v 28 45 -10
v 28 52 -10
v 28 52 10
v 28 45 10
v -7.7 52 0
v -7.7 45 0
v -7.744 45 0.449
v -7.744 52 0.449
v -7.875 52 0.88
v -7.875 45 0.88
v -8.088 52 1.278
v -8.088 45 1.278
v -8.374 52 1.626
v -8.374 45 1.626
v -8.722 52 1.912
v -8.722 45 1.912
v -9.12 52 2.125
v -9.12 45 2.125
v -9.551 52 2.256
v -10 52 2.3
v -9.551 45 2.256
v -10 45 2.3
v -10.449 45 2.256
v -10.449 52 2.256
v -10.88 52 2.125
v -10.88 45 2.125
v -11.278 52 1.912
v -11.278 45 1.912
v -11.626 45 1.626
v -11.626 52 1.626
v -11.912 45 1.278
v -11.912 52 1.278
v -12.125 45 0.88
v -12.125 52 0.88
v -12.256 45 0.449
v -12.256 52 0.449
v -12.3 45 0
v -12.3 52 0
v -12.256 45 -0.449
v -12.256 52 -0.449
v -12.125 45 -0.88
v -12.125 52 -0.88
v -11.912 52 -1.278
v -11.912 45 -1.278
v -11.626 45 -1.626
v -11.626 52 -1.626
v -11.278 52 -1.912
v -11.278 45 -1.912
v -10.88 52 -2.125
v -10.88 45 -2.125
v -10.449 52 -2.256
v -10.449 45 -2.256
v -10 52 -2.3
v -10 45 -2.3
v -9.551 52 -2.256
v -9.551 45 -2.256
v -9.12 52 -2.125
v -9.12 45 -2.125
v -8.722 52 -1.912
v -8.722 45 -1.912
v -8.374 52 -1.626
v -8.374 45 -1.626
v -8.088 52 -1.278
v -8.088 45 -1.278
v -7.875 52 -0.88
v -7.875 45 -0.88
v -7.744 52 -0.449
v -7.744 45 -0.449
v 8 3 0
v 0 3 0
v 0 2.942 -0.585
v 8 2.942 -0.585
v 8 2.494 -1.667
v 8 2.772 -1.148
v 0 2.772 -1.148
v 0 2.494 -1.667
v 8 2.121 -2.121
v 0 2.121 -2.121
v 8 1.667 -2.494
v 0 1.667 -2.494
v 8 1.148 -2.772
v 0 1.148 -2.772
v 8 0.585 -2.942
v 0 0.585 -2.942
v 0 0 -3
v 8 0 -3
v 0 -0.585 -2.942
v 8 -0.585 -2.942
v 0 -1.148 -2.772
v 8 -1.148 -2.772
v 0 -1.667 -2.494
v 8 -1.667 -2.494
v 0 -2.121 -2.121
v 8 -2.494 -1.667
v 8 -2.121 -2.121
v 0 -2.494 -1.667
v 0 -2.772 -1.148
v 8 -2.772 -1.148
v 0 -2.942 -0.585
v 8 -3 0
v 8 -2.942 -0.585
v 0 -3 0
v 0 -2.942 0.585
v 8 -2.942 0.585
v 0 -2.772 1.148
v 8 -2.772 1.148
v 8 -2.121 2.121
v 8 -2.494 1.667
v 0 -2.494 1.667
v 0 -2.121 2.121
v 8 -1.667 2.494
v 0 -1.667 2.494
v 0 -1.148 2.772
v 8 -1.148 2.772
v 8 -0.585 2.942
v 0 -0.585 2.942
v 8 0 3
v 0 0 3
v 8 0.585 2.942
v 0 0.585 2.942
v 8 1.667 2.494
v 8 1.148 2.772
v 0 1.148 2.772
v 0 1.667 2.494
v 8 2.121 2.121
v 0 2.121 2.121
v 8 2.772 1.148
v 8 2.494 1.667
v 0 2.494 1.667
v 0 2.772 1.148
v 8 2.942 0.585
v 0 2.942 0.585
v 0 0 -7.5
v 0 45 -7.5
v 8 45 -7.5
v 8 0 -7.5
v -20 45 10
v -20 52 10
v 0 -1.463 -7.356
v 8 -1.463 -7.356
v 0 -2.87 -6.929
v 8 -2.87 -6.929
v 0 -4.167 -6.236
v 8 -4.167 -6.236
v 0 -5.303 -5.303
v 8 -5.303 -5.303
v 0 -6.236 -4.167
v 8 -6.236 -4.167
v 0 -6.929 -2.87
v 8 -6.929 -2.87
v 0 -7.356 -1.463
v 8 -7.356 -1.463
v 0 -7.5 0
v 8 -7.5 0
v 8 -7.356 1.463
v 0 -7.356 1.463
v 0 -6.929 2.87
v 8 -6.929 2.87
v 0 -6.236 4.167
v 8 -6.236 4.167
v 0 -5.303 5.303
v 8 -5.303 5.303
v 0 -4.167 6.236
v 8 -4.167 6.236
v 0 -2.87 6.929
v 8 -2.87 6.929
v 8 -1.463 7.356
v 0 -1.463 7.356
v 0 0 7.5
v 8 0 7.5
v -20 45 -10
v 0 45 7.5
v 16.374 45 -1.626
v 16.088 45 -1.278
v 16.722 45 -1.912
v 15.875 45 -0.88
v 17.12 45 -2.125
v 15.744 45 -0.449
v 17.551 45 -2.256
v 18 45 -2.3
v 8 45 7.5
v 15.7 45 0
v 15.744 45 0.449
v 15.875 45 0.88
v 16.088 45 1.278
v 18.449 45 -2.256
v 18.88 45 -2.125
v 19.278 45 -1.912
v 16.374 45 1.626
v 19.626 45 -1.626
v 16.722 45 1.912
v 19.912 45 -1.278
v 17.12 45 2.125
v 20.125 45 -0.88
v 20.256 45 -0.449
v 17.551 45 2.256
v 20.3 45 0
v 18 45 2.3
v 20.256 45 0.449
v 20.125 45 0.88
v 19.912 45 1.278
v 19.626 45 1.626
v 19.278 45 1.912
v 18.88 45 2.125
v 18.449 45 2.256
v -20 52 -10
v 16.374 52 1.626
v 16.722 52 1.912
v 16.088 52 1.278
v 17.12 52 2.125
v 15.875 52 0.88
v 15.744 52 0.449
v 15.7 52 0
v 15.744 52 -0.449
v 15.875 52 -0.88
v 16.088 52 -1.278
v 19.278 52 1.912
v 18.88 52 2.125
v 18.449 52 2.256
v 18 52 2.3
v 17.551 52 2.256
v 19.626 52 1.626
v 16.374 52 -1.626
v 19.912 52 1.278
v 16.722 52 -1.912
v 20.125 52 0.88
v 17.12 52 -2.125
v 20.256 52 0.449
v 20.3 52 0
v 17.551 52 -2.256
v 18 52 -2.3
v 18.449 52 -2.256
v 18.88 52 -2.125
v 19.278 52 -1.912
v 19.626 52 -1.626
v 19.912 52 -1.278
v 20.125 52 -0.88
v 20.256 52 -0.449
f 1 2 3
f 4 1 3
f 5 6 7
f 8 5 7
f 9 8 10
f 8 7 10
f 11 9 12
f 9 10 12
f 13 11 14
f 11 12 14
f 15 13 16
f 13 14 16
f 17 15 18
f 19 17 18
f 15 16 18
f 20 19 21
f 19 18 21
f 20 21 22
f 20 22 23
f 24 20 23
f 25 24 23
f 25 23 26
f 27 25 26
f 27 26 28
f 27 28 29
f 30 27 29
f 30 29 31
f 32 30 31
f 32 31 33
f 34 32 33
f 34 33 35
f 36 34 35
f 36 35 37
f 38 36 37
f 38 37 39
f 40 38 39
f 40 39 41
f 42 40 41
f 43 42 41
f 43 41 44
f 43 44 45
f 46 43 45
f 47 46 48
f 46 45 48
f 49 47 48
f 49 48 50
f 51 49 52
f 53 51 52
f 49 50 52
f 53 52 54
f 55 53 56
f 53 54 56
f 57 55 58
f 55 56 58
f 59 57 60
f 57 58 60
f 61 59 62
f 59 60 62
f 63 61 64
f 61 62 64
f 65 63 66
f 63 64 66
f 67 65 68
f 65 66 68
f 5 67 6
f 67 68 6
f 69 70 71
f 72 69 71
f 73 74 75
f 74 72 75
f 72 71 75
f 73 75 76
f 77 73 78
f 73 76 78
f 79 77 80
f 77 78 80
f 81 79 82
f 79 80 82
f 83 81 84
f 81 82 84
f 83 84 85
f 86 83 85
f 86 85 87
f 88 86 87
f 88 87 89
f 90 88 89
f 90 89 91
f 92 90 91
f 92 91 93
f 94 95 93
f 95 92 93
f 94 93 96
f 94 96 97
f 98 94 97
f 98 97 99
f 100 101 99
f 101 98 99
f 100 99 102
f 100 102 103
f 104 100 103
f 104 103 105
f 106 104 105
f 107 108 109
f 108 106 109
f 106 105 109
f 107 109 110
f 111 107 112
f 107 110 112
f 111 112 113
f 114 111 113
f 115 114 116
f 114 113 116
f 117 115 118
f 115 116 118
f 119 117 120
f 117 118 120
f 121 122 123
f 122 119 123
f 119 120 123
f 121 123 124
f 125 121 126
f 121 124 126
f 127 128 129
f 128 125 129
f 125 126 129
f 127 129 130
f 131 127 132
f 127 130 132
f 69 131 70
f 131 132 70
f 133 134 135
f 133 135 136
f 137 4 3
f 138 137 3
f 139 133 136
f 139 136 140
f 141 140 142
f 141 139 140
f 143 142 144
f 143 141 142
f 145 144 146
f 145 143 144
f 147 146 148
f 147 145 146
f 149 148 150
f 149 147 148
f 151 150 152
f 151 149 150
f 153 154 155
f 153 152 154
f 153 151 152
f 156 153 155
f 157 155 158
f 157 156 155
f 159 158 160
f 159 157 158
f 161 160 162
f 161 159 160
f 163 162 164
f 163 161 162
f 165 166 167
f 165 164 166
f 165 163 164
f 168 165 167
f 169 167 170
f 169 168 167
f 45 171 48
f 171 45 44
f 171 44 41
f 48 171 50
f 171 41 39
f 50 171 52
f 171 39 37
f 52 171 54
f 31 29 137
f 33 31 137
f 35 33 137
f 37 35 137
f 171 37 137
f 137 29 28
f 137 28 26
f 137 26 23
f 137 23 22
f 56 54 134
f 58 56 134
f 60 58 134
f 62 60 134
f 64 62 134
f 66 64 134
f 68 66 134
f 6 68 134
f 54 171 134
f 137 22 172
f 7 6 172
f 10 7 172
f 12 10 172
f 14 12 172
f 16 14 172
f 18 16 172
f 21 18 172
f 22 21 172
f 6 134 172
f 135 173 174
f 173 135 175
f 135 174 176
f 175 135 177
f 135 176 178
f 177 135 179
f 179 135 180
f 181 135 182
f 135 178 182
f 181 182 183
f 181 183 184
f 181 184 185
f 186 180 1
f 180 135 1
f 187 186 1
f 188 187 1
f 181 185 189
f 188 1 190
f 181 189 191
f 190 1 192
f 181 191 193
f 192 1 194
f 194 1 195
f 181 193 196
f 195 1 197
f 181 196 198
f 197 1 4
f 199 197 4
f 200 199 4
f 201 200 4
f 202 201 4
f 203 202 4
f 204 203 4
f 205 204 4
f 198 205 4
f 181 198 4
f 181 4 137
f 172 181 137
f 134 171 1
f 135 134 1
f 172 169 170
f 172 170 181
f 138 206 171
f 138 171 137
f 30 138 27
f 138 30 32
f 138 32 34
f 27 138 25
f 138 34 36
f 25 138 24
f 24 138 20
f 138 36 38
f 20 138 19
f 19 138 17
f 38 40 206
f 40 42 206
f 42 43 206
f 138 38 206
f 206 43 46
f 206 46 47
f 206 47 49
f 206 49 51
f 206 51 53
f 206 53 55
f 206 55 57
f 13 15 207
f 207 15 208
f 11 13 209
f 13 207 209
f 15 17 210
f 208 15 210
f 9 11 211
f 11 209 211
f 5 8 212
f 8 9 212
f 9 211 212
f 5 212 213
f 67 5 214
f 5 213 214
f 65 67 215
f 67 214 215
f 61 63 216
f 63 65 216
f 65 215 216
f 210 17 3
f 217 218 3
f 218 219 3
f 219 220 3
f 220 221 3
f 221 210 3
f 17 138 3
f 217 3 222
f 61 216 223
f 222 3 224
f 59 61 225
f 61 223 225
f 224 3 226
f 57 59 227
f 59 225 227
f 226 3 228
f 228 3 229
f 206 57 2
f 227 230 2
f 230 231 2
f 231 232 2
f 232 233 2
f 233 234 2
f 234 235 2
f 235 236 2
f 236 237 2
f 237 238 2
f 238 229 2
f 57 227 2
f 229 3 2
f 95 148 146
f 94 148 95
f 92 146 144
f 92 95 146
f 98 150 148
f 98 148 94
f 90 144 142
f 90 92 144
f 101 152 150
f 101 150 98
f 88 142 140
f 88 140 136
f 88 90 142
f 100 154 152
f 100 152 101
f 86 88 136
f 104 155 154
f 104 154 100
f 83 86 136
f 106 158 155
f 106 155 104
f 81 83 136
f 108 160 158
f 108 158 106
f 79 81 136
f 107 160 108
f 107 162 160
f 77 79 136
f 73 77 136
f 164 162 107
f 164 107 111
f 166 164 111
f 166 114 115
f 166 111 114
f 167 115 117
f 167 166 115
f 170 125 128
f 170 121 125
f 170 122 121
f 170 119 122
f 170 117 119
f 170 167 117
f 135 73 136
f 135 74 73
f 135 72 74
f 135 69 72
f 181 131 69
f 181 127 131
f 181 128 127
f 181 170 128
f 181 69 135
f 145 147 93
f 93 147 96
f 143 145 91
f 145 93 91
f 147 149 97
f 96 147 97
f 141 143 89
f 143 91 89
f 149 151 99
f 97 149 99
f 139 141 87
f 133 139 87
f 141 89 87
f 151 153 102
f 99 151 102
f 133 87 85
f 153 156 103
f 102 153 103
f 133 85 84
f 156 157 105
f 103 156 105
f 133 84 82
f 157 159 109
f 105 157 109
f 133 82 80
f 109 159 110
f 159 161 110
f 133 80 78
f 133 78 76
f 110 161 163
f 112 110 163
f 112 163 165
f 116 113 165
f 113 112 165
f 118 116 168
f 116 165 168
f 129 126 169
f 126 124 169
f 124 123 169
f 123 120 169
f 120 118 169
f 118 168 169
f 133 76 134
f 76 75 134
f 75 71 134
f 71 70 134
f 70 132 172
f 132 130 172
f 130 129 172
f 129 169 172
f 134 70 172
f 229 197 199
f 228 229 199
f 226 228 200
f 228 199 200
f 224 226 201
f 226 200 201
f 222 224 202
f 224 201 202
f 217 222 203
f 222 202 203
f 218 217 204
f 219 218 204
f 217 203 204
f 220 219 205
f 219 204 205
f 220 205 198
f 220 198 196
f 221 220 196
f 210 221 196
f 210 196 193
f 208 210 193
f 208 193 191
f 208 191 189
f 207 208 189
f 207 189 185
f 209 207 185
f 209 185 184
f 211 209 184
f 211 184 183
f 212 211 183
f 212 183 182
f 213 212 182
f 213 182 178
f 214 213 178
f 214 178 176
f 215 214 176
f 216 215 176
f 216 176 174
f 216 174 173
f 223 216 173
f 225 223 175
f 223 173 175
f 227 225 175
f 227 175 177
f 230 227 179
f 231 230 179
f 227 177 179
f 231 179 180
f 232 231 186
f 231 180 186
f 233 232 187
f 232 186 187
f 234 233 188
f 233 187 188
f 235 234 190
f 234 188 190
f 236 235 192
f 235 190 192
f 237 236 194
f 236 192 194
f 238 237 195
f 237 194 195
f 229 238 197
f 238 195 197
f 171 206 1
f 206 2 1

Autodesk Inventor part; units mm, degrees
ref_plane "YZ Plane" through (0, 0, 0) normal (1, 0, 0) x (0, 1, 0)
ref_plane "XZ Plane" through (0, 0, 0) normal (0, 1, 0) x (-1, 0, 0)
ref_plane "XY Plane" through (0, 0, 0) normal (0, 0, 1) x (1, 0, 0)
sketch "Sketch1" plane through (0, 0, 0) normal (1, 0, 0) x (0, 1, 0)
  circle A0 centre (0, 0) radius 3
  circle A1 centre (0, 0) radius 7.5
  line L0 (0, 7.5) -> (45, 7.5)
  line L1 (45, 7.5) -> (45, -7.5)
  line L2 (45, -7.5) -> (0, -7.5)
  dimension "d0" = 6
  dimension "d1" = 15
  dimension "d2" = 45
extrude "Extrusion1" add sketch "Sketch1" along normal blind 8
sketch "Sketch2" plane through (0, 0, 0) normal (-1, 0, 0) x (0, 0, 1)
  line L0 (-10, 45) -> (10, 45)
  line L1 (10, 45) -> (10, 52)
  line L2 (10, 52) -> (-10, 52)
  line L3 (-10, 52) -> (-10, 45)
  line L4 (7.5, 45) -> (7.5, 0) projected
  line L5 (-7.5, 45) -> (7.5, 45) projected
  point P0 (0, 0)
  dimension "d5" = 20
  dimension "d6" = 2.5
  dimension "d7" = 0
  dimension "d8" = 7
extrude "Extrusion2" add sketch "Sketch2" along normal blind 20 and the other way blind 28
sketch "Sketch3" plane through (-20, 45, 10) normal (0, -1, 0) x (1, 0, 0)
  circle A0 centre (38, -10) radius 2.3
  circle A1 centre (10, -10) radius 2.3
  line L0 (48, 0) -> (0, 0) projected
  line L1 (48, 0) -> (48, -20) projected
  line L2 (0, -20) -> (0, 0) projected
  point P0 (20, -10)
  dimension "d13" = 10
  dimension "d14" = 10
  dimension "d15" = 4.6
  dimension "d16" = 4.6
  dimension "d17" = 10
  dimension "d18" = 10
extrude "Extrusion3" cut sketch "Sketch3" against normal mid plane 20
equation "\"d14\" = d13"
equation "\"d15\" = d16"
equation "\"d17\" = d14"
equation "\"d18\" = d13"
properties part number "RouleauMount"
